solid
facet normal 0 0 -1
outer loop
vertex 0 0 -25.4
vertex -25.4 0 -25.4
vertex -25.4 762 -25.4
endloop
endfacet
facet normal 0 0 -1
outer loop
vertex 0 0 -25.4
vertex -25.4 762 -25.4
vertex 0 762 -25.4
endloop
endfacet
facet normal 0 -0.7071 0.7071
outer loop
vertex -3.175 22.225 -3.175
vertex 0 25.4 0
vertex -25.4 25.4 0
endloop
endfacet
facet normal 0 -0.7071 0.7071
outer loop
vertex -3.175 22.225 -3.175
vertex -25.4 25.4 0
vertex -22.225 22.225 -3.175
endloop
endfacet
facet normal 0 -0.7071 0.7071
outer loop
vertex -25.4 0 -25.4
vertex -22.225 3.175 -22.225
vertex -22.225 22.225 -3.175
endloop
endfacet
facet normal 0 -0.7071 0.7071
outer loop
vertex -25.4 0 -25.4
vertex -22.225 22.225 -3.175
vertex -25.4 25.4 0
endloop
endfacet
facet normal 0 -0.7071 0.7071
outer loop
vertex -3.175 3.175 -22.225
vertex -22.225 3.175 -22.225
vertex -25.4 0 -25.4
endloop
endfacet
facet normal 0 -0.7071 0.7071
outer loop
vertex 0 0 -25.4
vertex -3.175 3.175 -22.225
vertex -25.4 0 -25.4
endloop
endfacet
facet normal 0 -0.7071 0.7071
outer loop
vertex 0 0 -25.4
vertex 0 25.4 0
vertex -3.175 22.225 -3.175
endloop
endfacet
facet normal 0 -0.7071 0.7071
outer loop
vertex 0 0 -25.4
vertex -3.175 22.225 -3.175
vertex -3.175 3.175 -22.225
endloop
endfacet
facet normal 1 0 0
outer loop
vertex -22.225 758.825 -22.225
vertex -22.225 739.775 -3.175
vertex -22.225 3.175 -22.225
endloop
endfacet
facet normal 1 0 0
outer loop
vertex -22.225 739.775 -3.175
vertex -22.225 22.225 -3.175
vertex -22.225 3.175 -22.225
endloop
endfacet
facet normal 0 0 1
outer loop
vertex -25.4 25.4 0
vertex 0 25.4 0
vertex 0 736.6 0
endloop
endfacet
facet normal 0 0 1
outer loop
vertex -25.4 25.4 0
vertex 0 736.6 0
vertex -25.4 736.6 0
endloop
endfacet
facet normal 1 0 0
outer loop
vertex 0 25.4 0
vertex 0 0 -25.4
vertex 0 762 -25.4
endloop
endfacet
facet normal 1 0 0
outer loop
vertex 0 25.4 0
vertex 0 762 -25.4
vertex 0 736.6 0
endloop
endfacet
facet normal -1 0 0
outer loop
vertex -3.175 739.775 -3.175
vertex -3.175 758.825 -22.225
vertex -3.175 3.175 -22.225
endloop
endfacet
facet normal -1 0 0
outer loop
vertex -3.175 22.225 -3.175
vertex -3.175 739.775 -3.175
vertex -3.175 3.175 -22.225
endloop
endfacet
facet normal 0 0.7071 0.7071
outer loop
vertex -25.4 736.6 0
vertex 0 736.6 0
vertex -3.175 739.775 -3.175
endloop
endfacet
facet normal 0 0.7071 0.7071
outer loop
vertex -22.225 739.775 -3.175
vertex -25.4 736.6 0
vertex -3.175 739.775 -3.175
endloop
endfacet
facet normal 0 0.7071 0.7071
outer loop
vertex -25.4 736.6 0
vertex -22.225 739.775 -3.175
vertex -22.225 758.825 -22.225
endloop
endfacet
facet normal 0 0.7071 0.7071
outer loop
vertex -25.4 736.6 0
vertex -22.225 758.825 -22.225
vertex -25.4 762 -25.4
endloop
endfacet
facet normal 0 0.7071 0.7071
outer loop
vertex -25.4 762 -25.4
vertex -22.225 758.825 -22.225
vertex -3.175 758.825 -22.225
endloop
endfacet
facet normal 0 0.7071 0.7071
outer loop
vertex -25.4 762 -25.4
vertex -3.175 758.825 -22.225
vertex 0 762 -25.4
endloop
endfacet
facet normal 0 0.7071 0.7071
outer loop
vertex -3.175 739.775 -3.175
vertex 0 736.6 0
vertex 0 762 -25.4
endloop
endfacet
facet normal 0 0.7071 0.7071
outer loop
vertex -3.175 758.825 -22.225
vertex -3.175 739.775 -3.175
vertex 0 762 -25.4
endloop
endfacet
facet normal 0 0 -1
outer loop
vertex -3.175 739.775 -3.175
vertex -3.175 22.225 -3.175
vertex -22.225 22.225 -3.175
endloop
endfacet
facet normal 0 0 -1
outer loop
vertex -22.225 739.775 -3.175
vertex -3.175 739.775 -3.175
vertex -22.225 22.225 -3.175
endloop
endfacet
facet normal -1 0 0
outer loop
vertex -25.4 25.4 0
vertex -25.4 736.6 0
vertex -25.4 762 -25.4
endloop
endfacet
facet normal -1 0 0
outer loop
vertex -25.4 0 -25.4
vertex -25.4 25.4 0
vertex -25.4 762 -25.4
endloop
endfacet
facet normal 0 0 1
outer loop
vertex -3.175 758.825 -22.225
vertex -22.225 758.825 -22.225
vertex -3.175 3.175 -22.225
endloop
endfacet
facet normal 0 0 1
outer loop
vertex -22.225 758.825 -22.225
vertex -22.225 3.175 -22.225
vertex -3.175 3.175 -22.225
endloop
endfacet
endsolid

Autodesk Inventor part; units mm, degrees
ref_plane "YZ Plane" through (0, 0, 0) normal (1, 0, 0) x (0, 1, 0)
ref_plane "XZ Plane" through (0, 0, 0) normal (0, 1, 0) x (-1, 0, 0)
ref_plane "XY Plane" through (0, 0, 0) normal (0, 0, 1) x (1, 0, 0)
sketch "Sketch1" plane through (0, 0, 0) normal (0, 1, 0) x (-1, 0, 0)
  line L0 (0, 0) -> (25.4, 0)
  line L1 (25.4, 0) -> (25.4, -25.4)
  line L2 (25.4, -25.4) -> (0, -25.4)
  line L3 (0, -25.4) -> (0, 0)
  line L4 (3.175, -3.175) -> (22.225, -3.175)
  line L5 (22.225, -3.175) -> (22.225, -22.225)
  line L6 (22.225, -22.225) -> (3.175, -22.225)
  line L7 (3.175, -22.225) -> (3.175, -3.175)
  dimension "d0" = 25.4
  dimension "d1" = 25.4
  dimension "d2" = 3.175
extrude "Extrusion1" add sketch "Sketch1" along normal blind 762
chamfer "Chamfer1" distance 25.4 angle 45 2 edges at (-12.7, 762, 0) (-12.7, 0, 0)
properties part number "1x1x30"
